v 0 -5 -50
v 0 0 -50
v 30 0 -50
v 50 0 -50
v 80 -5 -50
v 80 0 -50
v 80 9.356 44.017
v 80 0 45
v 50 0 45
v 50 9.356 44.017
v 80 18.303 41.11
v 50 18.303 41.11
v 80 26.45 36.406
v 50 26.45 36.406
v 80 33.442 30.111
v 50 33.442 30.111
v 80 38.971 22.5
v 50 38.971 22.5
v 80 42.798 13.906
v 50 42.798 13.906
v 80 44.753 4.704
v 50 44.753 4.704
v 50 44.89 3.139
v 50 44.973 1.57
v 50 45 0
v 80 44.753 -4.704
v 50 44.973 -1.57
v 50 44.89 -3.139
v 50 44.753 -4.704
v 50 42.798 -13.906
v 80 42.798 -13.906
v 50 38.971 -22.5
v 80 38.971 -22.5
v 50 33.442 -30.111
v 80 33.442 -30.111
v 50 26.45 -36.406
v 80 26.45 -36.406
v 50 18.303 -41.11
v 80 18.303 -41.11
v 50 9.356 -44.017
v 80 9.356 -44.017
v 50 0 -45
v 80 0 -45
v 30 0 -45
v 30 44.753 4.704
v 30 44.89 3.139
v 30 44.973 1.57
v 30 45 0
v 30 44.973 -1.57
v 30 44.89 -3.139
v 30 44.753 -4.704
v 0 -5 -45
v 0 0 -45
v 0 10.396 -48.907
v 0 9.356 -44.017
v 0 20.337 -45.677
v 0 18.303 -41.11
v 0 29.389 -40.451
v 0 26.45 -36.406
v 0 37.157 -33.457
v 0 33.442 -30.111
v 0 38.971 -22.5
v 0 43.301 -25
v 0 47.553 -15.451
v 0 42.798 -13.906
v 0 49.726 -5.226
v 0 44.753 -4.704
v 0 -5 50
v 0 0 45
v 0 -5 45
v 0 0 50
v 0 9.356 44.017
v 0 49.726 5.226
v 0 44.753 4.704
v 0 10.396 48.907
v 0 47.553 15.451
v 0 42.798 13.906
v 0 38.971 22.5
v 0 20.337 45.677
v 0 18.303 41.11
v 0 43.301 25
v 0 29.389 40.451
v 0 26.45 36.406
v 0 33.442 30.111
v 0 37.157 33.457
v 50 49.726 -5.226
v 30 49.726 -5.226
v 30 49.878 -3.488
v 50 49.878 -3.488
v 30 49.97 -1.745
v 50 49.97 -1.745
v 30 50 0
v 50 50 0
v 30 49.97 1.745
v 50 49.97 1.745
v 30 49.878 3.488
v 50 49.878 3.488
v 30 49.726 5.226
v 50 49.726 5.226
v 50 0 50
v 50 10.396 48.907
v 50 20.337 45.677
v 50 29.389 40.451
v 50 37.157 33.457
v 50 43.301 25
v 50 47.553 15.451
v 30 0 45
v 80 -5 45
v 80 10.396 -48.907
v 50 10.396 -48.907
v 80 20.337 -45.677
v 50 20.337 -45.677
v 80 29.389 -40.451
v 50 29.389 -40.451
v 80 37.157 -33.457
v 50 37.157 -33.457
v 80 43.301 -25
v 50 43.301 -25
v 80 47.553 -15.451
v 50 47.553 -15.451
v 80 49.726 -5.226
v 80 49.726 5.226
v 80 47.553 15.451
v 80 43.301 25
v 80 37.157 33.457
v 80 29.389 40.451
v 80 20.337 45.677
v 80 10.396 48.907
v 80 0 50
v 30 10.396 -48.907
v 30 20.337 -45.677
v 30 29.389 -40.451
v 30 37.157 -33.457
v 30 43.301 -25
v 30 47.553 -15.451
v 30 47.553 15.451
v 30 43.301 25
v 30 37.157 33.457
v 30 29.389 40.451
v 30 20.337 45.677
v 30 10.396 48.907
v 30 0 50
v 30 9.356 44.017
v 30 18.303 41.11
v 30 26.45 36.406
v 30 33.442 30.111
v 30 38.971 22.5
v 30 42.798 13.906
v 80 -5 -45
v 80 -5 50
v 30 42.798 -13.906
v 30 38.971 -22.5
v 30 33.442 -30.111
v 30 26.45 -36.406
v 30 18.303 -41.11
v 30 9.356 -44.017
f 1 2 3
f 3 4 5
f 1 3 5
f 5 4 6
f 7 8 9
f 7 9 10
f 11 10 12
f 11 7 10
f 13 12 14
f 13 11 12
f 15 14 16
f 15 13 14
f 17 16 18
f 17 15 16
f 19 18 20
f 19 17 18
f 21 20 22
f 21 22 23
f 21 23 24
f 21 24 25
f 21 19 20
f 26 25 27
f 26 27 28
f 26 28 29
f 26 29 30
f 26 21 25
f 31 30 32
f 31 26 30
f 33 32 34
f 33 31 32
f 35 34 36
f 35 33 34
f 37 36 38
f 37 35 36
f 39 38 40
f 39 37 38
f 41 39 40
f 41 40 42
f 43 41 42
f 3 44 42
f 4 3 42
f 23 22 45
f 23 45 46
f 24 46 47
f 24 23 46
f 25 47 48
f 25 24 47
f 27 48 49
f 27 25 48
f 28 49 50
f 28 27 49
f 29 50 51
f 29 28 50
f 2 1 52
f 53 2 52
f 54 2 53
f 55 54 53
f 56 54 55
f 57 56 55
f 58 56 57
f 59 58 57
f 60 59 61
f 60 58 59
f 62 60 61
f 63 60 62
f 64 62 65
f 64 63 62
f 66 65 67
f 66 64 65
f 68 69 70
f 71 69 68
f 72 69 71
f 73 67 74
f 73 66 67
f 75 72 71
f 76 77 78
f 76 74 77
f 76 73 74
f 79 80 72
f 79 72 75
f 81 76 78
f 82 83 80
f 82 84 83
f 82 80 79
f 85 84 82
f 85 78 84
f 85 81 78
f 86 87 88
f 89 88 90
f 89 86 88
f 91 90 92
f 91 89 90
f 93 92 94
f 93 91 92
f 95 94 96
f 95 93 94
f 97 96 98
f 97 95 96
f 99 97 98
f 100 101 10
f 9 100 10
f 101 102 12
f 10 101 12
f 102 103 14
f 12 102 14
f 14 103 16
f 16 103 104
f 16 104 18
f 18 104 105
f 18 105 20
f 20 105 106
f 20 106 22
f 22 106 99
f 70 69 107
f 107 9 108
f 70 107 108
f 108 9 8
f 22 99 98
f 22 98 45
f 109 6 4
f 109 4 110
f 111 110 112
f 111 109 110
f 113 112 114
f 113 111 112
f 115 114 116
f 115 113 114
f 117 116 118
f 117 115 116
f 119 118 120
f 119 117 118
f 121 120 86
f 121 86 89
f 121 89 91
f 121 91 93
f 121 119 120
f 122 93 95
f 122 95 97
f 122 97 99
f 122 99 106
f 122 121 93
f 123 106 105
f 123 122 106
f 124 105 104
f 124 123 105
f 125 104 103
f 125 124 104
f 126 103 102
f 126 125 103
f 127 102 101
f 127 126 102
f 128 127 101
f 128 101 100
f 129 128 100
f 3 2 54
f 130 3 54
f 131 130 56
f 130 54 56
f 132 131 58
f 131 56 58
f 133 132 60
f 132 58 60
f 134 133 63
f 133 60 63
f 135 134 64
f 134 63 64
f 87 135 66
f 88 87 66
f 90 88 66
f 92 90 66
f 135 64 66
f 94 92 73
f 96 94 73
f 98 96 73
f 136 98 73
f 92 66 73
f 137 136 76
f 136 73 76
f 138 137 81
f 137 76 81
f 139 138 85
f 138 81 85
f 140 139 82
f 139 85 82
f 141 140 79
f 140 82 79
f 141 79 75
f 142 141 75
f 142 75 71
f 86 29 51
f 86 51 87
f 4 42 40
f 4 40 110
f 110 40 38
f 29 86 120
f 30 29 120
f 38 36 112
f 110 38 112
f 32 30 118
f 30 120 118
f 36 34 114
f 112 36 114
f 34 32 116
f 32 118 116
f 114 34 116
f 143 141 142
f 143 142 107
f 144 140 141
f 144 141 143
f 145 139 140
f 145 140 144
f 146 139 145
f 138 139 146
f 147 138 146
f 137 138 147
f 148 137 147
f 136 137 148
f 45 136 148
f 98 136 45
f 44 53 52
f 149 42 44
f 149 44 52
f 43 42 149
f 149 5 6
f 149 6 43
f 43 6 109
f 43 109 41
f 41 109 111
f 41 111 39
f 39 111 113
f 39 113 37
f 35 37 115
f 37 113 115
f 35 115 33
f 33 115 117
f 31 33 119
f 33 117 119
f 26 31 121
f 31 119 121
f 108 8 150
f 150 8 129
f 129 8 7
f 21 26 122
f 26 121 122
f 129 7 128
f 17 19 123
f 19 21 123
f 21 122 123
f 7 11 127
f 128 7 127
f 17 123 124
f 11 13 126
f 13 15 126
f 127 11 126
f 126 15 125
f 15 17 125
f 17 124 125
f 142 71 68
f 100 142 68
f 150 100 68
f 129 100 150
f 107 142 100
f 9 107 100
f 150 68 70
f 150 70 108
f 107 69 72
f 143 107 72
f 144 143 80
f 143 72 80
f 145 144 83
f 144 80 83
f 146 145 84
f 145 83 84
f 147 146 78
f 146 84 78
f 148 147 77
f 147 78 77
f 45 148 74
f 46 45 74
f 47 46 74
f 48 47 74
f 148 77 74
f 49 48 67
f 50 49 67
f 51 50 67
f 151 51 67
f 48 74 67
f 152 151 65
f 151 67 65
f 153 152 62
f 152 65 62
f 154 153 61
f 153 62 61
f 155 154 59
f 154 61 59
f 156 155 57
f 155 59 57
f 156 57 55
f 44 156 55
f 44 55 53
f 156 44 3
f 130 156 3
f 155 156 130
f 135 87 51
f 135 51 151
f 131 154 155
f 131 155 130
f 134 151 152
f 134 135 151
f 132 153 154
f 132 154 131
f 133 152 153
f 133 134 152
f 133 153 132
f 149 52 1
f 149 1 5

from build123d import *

# Parameters (mm, degrees)
BOSS_EXTRUDE3_DEPTH = 30
BOSS_EXTRUDE4_DEPTH = 10
SKETCH4_W           = 80
SKETCH4_H           = 5
BOSS_EXTRUDE5_DEPTH = 5


with BuildPart() as part:
    # Sketch1 → Boss-Extrude3 (new body)
    with BuildSketch(Plane(origin=(0, 0, 0), x_dir=(0, 0, -1), z_dir=(1, 0, 0))):
        with BuildLine():
            Line((-50, 0), (-45, 0))
            ThreePointArc((-45, 0), (0, 45), (45, 0))
            Line((45, 0), (50, 0))
            ThreePointArc((50, 0), (0, 50), (-50, 0))
        make_face()
    extrude(amount=BOSS_EXTRUDE3_DEPTH)

    # Sketch3 → Boss-Extrude4 (add)
    with BuildSketch(Plane(origin=(30, 0, 0), x_dir=(0, 0, -1), z_dir=(1, 0, 0))):
        with BuildLine():
            Line((-5.226423163, 49.726094768), (-4.703780847, 44.753485292))
            ThreePointArc((-4.703780847, 44.753485292), (-2.355118031, 44.938329064), (0, 45))
            Line((0, 45), (0, 50))
            ThreePointArc((0, 50), (-2.616797812, 49.931476738), (-5.226423163, 49.726094768))
        make_face()
        with BuildLine():
            ThreePointArc((0, 45), (2.355118031, 44.938329064), (4.703780847, 44.753485292))
            Line((4.703780847, 44.753485292), (5.226423163, 49.726094768))
            ThreePointArc((5.226423163, 49.726094768), (2.616797812, 49.931476738), (0, 50))
            Line((0, 50), (0, 45))
        make_face()
    extrude(amount=BOSS_EXTRUDE4_DEPTH)

    # Mirror3: part across plane


with BuildPart() as part_1:
    add(part.part)
    add(part.part.mirror(Plane(origin=(40, 0, 0), x_dir=(0, 0, 1), z_dir=(1, 0, 0))))

    # Sketch4 → Boss-Extrude5 (add)
    with BuildSketch(Plane.XZ):
        with Locations((40, 47.5)):
            Rectangle(SKETCH4_W, SKETCH4_H)
        with Locations((40, -47.5)):
            Rectangle(SKETCH4_W, SKETCH4_H)
    extrude(amount=BOSS_EXTRUDE5_DEPTH)


solid = part_1.part
